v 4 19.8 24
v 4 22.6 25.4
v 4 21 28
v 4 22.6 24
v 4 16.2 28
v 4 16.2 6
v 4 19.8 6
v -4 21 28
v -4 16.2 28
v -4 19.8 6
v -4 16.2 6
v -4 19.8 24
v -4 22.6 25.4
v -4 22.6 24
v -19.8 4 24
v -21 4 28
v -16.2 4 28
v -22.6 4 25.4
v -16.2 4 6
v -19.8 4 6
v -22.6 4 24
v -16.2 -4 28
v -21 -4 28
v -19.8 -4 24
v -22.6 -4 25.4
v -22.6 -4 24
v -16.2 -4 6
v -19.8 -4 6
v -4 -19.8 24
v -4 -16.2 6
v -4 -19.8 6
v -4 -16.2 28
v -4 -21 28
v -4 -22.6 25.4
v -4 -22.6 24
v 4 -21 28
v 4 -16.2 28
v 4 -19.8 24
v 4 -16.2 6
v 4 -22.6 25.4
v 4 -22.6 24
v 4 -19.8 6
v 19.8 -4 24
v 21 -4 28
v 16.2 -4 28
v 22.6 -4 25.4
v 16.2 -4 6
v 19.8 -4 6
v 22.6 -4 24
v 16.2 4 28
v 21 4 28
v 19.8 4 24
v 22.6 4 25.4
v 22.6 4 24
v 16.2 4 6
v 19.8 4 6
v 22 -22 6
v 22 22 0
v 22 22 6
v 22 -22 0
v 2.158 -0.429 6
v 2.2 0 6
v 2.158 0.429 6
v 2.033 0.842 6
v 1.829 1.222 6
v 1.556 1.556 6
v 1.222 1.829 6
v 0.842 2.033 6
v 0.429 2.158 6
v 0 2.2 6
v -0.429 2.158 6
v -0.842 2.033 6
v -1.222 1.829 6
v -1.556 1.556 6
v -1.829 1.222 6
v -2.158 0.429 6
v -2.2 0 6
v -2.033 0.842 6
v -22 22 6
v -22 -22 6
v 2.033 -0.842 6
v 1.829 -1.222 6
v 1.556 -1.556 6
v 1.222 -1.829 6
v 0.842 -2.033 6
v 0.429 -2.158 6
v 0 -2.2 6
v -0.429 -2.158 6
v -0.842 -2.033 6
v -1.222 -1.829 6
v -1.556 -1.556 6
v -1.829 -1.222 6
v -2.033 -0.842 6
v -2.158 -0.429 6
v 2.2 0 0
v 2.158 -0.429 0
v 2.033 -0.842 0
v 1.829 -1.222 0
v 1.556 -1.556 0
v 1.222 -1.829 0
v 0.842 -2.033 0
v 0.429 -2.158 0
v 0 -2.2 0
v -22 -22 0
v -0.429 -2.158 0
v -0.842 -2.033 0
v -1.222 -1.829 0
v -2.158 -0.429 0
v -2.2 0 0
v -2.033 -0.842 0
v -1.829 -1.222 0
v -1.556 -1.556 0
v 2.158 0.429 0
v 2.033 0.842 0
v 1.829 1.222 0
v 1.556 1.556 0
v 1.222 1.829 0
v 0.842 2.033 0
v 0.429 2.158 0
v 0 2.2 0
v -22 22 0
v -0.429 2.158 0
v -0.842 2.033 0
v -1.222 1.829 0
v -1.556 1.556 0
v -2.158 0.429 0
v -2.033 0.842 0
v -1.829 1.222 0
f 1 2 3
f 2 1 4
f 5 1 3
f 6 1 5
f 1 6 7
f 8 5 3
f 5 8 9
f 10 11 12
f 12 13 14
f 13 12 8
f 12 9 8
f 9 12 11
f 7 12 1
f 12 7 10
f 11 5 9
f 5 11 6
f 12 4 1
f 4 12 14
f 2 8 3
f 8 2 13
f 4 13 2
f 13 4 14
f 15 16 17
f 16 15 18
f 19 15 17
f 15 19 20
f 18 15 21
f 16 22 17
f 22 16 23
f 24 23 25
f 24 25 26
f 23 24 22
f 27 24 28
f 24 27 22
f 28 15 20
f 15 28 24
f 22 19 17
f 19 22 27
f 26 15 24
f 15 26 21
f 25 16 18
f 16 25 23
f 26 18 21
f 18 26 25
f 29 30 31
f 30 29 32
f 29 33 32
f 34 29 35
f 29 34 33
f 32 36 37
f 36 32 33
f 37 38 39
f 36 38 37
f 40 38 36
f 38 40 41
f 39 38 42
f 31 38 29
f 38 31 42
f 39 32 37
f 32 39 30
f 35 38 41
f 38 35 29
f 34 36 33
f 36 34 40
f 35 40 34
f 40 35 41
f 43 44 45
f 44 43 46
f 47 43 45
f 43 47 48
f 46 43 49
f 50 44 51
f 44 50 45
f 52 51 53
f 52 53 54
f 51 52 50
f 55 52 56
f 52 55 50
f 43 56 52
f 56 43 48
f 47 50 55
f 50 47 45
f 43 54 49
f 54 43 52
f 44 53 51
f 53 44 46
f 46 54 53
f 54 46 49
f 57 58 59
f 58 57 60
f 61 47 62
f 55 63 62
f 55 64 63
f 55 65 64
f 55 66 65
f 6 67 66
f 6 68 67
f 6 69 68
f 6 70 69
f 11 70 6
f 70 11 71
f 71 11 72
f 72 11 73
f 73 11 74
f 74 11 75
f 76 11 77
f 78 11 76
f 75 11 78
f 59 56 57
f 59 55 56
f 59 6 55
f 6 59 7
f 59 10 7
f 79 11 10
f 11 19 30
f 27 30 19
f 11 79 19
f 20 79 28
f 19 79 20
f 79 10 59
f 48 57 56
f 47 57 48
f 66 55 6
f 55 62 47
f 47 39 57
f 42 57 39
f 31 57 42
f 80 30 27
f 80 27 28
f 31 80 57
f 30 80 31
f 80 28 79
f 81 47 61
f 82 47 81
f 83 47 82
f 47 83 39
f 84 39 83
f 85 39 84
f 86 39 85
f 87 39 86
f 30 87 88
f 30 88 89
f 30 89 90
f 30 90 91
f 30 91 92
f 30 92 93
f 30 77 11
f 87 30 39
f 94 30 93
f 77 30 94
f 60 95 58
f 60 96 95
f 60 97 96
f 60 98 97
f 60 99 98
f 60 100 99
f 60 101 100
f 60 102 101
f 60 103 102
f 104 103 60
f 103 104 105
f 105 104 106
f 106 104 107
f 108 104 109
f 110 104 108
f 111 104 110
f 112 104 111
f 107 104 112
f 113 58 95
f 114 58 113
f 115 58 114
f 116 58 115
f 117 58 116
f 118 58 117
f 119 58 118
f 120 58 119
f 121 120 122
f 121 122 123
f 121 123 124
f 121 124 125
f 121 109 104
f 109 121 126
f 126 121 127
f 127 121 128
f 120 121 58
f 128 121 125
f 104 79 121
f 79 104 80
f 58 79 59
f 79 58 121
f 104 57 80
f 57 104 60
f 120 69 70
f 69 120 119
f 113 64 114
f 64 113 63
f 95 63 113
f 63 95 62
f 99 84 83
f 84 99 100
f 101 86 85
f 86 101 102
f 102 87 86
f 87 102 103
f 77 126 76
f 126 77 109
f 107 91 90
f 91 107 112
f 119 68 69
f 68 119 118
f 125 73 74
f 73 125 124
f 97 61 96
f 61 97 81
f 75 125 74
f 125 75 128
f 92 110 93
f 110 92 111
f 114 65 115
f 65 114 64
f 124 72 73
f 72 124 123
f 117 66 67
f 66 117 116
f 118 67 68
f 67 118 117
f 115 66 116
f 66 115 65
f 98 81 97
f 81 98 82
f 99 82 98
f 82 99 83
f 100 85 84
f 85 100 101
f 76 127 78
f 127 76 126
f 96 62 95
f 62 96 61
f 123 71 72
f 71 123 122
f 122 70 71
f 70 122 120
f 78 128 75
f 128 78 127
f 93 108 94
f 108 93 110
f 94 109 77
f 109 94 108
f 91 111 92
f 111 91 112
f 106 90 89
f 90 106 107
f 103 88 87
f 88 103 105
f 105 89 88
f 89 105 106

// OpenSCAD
$fn = 32;

// ----------------------------------------------------------------------
// Snap-fit latch: 4 arms, 22 mm tall, 3 mm undercut hooks
// ----------------------------------------------------------------------

// --- parameters (mm) ---
base_d = 44;              // base plate depth
base_h = 6;               // base plate thickness
span = 36;                // distance between opposite arms
arm_t = 3.6;              // arm thickness
arm_d = 8;                // arm width
height = 22;              // free arm length
head_len = 3;             // hook reach
head_h = 4;               // hook height
lead = 1.4;               // lead-in ramp thickness
bore_d = 4.4;             // base fixing bore
top_z = 28;               // height of the arm tips above the base

arms = 4;

difference() {
  union() {
    /* base plate, centred on the arm ring */
    translate([-22, -22, 0]) cube([base_d, base_d, base_h]);
    for (a = [0 : 360 / arms : 359]) rotate([0, 0, a]) {
    /* arm, sunk 0.5 mm into the base */
    translate([-arm_d / 2, span / 2 - arm_t / 2, base_h - 0.5]) cube([arm_d, arm_t, height + 0.5]);
    /* hook: a convex hull of a tall inner block and a thin outer lip
       gives a flat undercut below and a lead-in ramp on top */
    hull() {
      translate([-arm_d / 2, span / 2 + arm_t / 2 - 0.6, top_z - head_h]) cube([arm_d, lead + 0.4, head_h]);
      translate([-arm_d / 2, span / 2 + arm_t / 2 - 0.2, top_z - head_h]) cube([arm_d, head_len, lead]);
    }
    }
  }
  translate([0, 0, -2.5]) cylinder(h = base_h + 5, d = bore_d);
}
